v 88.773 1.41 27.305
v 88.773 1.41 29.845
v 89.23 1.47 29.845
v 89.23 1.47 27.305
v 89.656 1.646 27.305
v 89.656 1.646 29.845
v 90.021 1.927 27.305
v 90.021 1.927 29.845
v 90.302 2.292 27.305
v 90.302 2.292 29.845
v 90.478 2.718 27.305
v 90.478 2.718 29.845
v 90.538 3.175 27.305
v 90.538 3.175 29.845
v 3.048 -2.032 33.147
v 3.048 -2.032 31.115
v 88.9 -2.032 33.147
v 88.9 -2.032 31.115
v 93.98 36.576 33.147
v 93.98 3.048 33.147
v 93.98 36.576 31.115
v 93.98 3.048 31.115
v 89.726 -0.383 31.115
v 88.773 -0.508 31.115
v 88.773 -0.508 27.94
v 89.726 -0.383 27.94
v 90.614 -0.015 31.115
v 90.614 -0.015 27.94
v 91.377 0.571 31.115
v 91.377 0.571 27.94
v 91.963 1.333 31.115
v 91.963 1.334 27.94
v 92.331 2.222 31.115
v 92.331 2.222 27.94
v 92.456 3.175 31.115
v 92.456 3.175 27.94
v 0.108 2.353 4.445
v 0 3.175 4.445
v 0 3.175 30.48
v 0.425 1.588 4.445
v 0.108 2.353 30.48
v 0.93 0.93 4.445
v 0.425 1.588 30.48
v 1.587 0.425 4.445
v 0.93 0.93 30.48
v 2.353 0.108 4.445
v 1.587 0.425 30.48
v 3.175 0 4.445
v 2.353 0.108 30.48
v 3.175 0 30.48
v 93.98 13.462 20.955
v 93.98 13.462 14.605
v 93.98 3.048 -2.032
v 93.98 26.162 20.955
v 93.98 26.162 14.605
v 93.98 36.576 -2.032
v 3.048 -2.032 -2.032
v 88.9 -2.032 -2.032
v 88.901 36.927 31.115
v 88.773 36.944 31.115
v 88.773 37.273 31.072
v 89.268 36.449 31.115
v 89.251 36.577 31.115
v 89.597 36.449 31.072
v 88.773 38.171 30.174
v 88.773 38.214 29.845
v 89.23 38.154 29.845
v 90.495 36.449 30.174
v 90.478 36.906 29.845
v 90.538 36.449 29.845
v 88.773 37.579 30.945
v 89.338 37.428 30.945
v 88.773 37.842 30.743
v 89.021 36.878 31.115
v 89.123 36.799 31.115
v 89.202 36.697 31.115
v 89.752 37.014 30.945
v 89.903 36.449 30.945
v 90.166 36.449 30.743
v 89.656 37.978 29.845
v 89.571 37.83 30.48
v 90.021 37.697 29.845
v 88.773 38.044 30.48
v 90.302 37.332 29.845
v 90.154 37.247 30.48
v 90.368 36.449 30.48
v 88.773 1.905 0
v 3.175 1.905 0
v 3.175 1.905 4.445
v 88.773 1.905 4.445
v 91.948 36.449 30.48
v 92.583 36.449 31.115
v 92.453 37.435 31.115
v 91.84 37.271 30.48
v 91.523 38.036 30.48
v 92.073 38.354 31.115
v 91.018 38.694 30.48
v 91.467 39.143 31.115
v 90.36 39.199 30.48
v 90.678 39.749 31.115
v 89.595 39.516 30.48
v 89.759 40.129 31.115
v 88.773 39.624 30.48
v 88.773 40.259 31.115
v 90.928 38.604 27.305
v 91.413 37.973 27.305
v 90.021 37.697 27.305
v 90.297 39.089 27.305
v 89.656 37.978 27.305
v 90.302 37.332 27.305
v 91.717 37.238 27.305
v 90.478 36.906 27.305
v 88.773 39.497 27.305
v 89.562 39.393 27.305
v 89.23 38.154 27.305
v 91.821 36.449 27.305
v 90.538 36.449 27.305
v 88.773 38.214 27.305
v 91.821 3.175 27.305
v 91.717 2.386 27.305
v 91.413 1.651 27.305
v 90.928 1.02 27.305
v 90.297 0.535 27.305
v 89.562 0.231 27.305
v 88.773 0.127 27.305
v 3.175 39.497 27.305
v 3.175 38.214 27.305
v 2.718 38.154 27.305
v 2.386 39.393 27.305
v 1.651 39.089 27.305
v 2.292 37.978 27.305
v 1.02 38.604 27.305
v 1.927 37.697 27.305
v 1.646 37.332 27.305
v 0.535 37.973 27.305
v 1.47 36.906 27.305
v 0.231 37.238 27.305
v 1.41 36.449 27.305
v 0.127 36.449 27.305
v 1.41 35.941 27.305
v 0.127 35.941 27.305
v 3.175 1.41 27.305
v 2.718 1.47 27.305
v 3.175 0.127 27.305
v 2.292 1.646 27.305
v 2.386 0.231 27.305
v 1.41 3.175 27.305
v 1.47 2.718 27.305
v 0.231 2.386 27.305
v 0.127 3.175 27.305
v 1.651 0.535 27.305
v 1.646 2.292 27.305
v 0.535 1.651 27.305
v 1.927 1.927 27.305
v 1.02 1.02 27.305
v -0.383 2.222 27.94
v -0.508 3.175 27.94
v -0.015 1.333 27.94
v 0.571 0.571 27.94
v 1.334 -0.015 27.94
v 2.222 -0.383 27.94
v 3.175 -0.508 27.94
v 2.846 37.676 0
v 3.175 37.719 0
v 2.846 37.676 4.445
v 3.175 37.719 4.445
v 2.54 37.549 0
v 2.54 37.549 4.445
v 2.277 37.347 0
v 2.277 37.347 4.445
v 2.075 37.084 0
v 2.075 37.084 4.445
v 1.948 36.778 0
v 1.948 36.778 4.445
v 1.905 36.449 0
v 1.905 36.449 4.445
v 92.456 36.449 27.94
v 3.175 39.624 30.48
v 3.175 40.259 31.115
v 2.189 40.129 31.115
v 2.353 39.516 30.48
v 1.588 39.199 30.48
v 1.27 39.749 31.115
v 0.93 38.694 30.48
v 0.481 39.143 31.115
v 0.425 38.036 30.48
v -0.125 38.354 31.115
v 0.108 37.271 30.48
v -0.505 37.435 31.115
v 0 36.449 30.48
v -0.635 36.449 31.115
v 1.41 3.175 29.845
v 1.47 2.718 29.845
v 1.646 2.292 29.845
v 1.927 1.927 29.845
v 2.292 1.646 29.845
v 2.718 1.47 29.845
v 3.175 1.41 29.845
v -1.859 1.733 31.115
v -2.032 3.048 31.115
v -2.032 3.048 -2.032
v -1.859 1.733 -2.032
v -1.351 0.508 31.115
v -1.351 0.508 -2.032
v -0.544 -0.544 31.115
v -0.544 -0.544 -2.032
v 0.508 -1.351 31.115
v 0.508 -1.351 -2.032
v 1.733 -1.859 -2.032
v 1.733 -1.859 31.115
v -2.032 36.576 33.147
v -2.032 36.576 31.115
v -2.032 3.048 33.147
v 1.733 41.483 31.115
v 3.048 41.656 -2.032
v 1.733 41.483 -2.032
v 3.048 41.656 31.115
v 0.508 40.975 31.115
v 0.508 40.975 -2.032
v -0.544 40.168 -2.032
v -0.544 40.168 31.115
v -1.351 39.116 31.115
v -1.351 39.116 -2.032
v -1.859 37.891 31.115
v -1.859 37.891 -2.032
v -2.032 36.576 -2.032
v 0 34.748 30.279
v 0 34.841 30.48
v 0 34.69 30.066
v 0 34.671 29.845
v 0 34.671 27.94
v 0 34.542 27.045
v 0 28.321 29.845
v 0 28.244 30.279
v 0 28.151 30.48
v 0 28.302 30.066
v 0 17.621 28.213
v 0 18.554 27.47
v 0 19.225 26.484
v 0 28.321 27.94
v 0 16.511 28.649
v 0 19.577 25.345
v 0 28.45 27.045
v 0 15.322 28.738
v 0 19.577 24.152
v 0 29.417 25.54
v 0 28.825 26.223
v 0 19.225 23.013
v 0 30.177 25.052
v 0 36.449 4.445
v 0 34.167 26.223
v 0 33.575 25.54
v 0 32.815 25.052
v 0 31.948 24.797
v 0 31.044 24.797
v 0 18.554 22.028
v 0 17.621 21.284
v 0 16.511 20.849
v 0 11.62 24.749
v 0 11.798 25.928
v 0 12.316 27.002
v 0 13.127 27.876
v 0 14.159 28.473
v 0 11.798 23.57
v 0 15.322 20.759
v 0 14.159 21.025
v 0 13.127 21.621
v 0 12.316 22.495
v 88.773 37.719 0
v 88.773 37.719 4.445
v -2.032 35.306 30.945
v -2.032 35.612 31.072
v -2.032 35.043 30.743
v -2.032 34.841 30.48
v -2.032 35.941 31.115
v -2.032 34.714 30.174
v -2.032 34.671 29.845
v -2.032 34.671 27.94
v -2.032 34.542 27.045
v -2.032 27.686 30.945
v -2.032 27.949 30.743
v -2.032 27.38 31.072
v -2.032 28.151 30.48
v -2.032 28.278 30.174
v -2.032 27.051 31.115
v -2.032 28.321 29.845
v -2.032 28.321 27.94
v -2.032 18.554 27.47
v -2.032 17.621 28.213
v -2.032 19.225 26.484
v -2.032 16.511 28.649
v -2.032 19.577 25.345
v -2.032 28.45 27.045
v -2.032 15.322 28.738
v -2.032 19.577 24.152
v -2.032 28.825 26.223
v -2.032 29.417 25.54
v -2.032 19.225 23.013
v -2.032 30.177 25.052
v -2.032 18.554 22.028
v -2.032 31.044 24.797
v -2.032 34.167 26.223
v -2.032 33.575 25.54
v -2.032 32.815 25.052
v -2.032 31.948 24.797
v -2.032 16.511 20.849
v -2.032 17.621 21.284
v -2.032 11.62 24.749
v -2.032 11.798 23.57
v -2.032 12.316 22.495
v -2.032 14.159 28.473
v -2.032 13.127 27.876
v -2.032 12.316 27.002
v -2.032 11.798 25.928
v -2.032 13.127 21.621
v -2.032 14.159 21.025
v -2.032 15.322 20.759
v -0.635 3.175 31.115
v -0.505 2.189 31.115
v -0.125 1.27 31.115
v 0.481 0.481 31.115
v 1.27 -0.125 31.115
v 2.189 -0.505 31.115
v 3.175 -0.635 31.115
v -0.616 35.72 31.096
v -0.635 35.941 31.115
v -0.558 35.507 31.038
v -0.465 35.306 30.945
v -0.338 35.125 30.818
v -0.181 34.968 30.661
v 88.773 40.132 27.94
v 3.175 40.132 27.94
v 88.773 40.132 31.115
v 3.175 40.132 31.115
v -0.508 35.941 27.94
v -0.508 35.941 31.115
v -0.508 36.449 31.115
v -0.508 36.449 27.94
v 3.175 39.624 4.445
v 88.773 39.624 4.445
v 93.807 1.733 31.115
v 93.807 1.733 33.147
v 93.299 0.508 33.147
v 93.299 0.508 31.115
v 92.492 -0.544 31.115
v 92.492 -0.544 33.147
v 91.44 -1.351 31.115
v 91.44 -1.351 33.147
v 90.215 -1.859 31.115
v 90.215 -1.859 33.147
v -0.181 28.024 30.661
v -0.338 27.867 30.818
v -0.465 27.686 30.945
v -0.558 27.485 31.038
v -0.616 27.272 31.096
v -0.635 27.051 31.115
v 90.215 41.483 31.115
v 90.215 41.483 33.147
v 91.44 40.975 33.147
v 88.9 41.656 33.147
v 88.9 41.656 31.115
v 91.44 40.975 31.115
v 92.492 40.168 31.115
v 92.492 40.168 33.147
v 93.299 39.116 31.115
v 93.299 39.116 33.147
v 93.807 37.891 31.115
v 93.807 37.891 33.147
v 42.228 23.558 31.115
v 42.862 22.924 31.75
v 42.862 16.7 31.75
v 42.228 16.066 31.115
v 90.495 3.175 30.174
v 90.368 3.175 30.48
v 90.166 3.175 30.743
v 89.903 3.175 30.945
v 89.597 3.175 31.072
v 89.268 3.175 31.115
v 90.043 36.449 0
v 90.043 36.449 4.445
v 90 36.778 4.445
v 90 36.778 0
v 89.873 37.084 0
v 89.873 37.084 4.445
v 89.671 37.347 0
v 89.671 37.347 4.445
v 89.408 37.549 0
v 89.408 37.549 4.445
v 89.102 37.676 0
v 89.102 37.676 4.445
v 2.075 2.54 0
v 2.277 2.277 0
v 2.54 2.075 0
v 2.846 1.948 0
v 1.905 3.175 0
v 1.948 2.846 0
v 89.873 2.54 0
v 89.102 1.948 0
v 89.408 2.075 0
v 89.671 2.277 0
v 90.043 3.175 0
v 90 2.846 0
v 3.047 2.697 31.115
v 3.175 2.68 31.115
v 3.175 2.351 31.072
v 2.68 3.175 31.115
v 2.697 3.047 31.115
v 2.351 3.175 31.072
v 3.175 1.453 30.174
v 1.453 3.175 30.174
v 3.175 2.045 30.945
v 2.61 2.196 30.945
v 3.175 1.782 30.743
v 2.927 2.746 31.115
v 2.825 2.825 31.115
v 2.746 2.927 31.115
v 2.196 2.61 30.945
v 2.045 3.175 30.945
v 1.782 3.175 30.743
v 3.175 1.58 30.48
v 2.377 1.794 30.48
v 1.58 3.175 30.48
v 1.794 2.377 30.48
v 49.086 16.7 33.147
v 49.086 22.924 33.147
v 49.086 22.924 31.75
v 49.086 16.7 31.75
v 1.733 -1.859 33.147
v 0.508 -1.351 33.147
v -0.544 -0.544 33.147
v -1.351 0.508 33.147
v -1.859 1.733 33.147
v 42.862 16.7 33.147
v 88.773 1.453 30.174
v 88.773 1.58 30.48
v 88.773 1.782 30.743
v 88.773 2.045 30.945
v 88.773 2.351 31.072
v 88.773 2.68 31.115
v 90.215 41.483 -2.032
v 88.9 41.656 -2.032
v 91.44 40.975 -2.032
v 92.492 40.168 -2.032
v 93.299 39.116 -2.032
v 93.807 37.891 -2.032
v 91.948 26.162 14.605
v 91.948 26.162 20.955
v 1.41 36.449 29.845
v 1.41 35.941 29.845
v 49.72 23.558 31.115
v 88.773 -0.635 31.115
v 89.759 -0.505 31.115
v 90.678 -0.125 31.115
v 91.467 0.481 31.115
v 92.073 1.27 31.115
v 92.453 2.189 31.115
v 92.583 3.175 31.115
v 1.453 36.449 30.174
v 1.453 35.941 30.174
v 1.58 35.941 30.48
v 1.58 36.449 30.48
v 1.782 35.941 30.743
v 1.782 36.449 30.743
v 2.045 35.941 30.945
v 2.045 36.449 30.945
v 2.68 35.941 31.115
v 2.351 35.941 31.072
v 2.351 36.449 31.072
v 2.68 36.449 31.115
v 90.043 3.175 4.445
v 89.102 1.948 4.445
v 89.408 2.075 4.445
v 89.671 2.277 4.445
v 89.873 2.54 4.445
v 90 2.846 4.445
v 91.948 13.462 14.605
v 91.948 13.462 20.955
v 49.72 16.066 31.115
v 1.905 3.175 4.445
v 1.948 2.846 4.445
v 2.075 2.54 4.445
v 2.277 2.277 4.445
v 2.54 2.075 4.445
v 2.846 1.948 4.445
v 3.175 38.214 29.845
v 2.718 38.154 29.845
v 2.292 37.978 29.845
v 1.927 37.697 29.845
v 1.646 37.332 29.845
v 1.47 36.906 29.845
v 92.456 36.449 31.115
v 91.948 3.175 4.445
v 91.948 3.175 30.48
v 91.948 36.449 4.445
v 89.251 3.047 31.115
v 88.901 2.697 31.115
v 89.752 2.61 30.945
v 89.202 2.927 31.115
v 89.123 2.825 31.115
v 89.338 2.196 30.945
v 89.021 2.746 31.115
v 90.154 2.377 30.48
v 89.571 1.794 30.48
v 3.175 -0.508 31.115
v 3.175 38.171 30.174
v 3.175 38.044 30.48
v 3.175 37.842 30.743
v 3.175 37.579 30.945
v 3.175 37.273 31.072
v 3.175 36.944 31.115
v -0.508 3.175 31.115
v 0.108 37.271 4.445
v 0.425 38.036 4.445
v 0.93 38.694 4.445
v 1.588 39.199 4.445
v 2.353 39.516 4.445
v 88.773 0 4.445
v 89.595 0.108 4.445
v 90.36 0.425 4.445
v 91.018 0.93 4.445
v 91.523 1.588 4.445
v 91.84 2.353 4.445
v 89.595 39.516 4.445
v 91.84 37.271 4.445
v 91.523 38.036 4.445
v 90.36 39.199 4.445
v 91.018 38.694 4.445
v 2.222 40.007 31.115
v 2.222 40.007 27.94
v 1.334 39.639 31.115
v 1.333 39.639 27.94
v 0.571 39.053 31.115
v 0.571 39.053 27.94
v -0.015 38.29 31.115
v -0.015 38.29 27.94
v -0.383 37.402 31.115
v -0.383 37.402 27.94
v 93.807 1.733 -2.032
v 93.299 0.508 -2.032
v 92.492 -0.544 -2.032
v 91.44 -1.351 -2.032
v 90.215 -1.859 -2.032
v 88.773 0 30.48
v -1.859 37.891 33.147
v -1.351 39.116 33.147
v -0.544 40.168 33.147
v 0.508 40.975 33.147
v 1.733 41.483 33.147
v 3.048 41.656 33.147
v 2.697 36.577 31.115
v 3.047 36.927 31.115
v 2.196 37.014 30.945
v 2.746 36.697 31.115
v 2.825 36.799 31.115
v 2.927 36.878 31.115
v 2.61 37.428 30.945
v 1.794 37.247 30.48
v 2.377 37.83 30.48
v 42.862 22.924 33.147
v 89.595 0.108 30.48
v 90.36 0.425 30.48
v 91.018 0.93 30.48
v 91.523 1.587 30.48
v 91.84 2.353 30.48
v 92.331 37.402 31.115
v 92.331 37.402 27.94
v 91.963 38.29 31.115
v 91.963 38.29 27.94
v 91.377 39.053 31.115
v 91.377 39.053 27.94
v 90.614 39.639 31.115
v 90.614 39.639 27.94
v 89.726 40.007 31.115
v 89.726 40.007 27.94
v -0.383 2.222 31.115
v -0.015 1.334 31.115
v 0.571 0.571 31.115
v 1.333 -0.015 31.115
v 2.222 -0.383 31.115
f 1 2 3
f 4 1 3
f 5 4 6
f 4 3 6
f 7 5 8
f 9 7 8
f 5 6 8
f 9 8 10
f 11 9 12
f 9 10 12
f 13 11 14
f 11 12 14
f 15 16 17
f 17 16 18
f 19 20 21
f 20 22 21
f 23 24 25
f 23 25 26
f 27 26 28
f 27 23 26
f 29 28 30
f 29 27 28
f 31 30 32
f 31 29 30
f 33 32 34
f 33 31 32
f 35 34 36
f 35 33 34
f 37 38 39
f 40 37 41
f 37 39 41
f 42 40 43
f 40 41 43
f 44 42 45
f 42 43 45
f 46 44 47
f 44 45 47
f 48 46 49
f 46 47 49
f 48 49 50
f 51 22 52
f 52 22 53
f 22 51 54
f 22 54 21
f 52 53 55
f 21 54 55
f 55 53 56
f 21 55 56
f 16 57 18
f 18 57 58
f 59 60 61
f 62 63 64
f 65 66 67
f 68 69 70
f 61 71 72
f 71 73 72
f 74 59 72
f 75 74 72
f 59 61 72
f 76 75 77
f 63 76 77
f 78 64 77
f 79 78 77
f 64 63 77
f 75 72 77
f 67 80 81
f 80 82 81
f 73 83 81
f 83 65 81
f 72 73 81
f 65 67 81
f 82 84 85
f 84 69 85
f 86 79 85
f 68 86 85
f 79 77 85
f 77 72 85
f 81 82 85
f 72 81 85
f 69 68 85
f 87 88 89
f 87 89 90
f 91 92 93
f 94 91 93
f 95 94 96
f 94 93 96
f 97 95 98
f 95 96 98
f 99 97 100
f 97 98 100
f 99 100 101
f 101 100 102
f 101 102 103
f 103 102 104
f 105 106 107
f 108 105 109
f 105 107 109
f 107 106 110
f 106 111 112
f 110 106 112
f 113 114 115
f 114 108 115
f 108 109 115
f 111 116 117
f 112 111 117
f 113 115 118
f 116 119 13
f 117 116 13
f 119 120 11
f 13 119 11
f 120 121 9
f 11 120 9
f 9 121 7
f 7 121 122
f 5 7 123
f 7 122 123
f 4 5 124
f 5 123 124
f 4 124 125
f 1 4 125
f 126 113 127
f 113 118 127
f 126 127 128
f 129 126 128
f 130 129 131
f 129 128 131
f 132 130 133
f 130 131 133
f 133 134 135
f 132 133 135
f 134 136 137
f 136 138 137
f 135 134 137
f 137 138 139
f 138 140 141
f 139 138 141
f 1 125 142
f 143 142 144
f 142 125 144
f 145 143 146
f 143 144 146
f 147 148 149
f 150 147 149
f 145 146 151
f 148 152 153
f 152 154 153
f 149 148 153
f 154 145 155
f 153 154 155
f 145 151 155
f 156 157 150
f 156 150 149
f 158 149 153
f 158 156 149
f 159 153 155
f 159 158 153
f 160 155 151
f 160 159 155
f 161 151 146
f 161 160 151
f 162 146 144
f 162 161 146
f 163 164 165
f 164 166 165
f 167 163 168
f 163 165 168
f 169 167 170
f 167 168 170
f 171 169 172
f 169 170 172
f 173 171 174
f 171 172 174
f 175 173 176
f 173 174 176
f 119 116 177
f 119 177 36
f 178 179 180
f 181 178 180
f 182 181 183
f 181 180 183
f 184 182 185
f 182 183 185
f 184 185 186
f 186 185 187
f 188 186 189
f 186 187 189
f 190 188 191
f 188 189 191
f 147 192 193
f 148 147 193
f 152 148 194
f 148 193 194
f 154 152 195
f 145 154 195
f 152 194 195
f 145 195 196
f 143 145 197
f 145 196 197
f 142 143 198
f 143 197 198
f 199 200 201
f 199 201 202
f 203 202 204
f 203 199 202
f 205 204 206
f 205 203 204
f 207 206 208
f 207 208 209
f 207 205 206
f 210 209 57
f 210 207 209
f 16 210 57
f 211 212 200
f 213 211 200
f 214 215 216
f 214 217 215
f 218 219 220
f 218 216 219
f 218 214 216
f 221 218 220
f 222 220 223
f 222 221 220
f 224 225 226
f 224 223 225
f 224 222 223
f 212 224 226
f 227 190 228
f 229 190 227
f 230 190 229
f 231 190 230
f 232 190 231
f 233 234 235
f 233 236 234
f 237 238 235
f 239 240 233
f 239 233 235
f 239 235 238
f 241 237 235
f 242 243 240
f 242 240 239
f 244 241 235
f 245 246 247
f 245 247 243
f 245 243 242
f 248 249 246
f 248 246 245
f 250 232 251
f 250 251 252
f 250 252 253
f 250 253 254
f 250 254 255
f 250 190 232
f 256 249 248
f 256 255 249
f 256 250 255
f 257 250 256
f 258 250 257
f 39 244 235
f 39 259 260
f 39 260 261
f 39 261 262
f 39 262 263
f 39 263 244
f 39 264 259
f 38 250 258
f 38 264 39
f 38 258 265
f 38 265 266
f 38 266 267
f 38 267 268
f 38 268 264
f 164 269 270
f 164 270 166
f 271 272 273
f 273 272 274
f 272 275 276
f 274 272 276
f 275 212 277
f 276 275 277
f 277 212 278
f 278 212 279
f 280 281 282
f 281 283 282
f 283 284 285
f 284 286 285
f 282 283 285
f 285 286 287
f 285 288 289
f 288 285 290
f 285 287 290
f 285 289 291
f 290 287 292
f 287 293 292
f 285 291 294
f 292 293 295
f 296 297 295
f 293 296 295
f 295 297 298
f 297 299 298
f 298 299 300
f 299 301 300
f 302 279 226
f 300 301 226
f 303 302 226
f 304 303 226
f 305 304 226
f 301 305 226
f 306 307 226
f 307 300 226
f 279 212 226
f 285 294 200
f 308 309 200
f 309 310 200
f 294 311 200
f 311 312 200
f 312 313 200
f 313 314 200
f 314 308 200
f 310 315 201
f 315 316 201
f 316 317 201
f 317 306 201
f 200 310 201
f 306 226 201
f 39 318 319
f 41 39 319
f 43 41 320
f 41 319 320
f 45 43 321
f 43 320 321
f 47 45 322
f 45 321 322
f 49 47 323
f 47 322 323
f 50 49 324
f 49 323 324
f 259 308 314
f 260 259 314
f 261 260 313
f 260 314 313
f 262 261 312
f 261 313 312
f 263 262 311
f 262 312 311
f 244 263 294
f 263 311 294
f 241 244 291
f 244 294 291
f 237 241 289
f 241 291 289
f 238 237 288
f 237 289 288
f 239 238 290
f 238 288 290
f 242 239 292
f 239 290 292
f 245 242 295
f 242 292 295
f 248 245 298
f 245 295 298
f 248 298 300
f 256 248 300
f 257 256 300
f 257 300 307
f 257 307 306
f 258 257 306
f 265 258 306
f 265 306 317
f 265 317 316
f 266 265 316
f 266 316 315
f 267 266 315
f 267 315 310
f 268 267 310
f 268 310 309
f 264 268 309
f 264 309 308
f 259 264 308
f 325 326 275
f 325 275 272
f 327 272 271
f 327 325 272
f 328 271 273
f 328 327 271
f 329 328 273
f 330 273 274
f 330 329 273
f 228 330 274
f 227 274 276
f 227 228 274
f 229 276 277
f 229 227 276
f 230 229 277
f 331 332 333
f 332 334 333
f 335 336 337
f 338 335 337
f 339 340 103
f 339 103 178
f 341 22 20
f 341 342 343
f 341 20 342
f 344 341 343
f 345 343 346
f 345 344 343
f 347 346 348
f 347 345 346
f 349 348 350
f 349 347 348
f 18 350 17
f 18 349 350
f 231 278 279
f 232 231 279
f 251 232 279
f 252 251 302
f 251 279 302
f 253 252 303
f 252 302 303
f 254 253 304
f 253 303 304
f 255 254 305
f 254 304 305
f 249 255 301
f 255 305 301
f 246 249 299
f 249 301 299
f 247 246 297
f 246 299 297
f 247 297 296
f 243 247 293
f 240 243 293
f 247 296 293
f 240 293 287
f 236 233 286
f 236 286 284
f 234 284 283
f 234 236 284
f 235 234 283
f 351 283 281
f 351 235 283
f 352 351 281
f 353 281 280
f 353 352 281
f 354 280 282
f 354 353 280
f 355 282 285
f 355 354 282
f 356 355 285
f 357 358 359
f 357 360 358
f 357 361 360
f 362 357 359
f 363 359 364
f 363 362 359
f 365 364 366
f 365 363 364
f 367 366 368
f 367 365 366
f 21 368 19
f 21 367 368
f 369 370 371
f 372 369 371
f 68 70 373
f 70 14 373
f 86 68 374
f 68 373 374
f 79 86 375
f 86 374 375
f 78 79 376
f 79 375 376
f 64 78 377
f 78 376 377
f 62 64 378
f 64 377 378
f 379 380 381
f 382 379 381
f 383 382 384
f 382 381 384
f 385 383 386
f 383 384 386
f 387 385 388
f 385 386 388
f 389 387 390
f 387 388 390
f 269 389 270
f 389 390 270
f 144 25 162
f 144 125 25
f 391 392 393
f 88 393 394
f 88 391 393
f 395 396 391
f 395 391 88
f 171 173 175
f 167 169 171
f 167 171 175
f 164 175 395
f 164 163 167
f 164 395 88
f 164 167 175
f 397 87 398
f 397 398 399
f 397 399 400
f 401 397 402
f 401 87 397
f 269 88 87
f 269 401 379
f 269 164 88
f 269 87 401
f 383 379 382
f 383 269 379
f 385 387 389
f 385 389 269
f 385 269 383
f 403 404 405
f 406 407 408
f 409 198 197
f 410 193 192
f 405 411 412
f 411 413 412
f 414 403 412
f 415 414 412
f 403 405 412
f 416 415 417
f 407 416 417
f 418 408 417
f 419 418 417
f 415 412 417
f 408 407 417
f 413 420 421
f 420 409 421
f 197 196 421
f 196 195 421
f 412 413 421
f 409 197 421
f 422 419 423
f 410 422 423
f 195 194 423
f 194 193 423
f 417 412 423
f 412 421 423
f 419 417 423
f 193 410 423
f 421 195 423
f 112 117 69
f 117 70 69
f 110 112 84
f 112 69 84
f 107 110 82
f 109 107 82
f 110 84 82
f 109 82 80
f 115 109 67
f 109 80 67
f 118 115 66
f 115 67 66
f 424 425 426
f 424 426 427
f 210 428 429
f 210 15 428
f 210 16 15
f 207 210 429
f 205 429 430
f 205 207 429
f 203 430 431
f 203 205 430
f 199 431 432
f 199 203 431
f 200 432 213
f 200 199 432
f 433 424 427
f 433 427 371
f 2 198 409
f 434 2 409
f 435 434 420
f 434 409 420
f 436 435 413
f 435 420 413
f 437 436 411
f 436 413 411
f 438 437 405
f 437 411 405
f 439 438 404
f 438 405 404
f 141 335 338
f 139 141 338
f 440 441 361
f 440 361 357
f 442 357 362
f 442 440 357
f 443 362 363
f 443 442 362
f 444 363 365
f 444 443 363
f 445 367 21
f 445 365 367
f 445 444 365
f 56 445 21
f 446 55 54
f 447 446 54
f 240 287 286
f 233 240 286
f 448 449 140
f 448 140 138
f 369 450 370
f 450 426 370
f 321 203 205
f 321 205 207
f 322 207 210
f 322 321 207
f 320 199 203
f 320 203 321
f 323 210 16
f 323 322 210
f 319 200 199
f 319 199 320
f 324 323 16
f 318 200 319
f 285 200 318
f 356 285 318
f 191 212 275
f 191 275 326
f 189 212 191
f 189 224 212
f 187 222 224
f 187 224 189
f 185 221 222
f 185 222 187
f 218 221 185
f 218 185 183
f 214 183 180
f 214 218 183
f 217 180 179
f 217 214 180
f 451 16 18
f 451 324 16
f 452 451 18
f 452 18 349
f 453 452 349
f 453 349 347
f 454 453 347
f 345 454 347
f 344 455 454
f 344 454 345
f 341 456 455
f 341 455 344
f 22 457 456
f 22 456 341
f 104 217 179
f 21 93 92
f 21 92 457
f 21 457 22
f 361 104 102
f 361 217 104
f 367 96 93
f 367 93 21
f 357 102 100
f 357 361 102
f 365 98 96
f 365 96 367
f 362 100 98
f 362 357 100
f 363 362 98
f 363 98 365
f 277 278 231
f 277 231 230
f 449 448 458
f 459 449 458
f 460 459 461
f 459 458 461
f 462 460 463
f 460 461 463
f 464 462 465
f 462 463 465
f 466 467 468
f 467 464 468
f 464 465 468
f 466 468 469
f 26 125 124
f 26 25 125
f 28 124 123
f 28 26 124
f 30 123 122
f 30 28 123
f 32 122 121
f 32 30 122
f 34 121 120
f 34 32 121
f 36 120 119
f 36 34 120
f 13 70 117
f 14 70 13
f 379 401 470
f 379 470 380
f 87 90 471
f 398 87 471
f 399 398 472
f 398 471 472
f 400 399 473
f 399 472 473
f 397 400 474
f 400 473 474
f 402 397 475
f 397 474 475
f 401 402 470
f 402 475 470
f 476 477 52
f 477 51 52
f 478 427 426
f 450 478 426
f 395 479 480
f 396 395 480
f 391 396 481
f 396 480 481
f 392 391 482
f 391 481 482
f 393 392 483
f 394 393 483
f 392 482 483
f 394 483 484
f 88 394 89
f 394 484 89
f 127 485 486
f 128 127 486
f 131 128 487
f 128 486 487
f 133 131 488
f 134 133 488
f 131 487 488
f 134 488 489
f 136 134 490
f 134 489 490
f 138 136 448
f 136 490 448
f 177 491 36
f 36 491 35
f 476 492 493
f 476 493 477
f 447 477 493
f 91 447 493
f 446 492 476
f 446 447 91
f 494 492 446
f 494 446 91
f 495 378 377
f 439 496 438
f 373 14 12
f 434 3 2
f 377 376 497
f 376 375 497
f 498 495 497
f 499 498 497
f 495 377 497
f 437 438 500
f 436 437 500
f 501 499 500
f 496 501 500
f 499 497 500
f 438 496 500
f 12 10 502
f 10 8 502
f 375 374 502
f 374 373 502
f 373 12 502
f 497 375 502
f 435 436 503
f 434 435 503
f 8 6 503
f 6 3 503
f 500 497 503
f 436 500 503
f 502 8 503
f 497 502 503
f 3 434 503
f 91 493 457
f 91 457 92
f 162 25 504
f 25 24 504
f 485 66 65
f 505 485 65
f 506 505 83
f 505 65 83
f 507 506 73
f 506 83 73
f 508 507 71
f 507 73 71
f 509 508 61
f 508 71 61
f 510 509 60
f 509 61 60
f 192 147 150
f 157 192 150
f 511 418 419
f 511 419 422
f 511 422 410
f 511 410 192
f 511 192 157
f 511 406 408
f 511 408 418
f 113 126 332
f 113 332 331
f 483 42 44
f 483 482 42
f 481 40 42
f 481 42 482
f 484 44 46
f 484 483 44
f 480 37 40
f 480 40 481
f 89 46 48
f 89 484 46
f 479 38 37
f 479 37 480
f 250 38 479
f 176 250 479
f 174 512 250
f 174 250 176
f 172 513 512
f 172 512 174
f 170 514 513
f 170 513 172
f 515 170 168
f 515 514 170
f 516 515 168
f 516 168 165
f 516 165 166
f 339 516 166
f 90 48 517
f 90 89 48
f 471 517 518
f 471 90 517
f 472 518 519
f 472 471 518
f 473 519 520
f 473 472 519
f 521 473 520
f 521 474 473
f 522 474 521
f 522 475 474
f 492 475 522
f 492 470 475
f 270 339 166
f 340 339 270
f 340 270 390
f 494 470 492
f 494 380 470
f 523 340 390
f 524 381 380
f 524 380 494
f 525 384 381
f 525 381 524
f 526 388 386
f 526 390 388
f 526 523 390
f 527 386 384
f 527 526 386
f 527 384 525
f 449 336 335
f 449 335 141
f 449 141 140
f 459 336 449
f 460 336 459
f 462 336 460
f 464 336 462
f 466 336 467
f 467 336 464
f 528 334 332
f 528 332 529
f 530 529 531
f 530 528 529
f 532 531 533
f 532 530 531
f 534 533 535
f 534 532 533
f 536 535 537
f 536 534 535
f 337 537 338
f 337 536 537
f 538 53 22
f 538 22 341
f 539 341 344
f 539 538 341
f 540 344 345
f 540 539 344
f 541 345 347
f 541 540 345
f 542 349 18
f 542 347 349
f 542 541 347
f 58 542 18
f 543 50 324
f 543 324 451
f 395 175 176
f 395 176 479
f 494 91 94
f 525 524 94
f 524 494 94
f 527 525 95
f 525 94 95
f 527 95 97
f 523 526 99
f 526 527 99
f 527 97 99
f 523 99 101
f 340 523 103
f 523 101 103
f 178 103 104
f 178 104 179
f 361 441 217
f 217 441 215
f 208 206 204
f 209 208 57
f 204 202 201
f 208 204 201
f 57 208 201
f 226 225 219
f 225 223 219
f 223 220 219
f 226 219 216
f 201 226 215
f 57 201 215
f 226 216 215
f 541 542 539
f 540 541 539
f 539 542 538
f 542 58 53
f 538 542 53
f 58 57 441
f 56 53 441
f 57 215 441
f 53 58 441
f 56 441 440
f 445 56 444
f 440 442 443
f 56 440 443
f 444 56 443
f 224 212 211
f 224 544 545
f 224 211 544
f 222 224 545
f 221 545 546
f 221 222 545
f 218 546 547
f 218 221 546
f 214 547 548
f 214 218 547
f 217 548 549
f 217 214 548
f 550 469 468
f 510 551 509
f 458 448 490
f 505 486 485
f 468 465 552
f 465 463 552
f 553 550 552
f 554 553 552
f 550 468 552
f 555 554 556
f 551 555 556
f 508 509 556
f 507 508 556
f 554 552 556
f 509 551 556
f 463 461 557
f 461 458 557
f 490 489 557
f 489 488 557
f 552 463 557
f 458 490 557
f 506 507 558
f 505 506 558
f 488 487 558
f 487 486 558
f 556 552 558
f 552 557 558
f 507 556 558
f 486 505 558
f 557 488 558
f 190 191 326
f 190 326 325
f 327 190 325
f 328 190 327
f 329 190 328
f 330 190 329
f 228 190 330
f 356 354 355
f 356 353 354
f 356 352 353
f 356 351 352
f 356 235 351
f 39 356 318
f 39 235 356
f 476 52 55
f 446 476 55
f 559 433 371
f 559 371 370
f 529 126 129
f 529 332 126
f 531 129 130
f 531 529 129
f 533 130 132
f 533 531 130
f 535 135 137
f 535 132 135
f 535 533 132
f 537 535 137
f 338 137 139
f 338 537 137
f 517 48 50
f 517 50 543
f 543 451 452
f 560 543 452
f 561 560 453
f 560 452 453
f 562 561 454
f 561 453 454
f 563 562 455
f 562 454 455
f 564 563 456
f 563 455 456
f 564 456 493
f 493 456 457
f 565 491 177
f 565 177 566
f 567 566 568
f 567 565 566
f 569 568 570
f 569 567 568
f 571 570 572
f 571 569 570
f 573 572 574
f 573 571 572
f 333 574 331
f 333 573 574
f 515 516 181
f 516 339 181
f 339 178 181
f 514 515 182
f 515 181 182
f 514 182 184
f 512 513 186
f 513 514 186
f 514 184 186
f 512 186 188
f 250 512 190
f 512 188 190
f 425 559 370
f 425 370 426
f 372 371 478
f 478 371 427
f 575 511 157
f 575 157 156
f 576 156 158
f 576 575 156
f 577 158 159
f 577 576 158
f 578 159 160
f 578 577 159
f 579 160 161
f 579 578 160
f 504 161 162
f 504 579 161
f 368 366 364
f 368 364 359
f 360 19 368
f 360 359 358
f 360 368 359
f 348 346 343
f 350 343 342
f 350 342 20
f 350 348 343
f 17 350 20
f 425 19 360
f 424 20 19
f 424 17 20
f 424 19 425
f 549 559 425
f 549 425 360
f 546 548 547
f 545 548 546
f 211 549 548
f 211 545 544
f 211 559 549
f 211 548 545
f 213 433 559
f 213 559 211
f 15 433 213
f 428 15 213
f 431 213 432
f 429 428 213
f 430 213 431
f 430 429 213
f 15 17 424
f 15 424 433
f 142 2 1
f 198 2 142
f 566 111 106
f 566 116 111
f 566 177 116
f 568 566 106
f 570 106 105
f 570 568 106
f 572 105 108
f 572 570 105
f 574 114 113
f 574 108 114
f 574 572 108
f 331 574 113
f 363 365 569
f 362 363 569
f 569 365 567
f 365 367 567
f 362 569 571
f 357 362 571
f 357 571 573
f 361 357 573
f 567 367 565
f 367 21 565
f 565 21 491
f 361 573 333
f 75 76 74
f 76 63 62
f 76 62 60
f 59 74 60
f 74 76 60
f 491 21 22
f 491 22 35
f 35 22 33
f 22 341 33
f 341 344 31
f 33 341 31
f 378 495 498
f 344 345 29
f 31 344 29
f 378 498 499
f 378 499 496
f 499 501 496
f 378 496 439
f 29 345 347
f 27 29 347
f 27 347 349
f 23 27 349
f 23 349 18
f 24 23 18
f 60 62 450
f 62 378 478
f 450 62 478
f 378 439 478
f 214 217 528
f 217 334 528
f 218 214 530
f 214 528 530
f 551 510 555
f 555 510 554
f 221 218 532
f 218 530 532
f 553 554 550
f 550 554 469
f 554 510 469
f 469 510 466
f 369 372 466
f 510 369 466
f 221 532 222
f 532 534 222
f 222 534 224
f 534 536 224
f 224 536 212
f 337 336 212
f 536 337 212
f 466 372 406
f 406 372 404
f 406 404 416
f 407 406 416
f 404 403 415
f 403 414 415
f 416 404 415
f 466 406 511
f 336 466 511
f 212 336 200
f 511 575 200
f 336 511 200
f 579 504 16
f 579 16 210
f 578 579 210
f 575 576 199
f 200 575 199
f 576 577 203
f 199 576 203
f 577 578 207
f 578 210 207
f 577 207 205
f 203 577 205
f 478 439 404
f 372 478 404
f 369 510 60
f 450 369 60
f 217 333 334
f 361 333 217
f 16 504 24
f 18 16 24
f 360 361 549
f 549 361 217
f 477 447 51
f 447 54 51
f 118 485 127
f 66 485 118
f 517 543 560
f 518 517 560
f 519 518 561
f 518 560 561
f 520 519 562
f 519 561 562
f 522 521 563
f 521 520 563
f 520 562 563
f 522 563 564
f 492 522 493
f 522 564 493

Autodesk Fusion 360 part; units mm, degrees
sketch "Sketch1" plane through (0, 0, 0) normal (0, 0, 1) x (1, 0, 0)
  line L0 (0, 0) -> (91.948, 0)
  line L1 (91.948, 0) -> (91.948, 39.624)
  line L2 (91.948, 39.624) -> (0, 39.624)
  line L3 (0, 39.624) -> (0, 0)
  line L4 (-2.032, 41.656) -> (-2.032, -2.032)
  line L5 (-2.032, -2.032) -> (93.98, -2.032)
  line L6 (93.98, -2.032) -> (93.98, 41.656)
  line L7 (93.98, 41.656) -> (-2.032, 41.656)
  line L8 (1.905, 37.719) -> (1.905, 1.905)
  line L9 (1.905, 1.905) -> (90.043, 1.905)
  line L10 (90.043, 1.905) -> (90.043, 37.719)
  line L11 (90.043, 37.719) -> (1.905, 37.719)
  dimension "d1" = 91.948
  dimension "d2" = 39.624
  dimension "d3" = 2.032
  dimension "d4" = -1.905
extrude "Extrude1" add sketch "Sketch1" against normal blind 2.032 contours L0 L1 L2 L3 | L4 L5 L6 L7 | L8 L9 L10 L11 makes body 1
extrude "Extrude2" add sketch "Sketch1" along normal blind 4.445 contours L0 L1 L2 L3 bodies 1
extrude "Extrude3" add sketch "Sketch1" along normal blind 31.115 contours L4 L5 L6 L7 bodies 1
sketch "Sketch2" plane through (93.98, 0, 0) normal (1, 0, 0) x (0, 1, 0)
  line L0 (-2.032, 31.115) -> (-2.032, -2.032)
  line L1 (-2.032, -2.032) -> (41.656, -2.032)
  line L2 (41.656, -2.032) -> (41.656, 31.115)
  line L3 (41.656, 31.115) -> (-2.032, 31.115)
  line L4 (19.812, -2.032) -> (19.812, 20.955)
  line L5 (19.812, 20.955) -> (26.162, 20.955)
  line L6 (19.812, 20.955) -> (13.462, 20.955)
  line L7 (13.462, 20.955) -> (13.462, 14.605)
  line L8 (13.462, 14.605) -> (26.162, 14.605)
  line L9 (26.162, 14.605) -> (26.162, 20.955)
  dimension "d11" = 22.987
  dimension "d12" = 6.35
  dimension "d13" = 6.35
  dimension "d14" = 6.35
extrude "Extrude4" cut sketch "Sketch2" against normal blind 7.62 contours L4 L6 L7 L8 | L4 L5 L8 L9 bodies 1
sketch "Sketch3" plane through (-2.032, 0, 0) normal (-1, 0, 0) x (0, -1, 0)
  line L0 (-41.656, 31.115) -> (-41.656, -2.032)
  line L1 (-41.656, -2.032) -> (2.032, -2.032)
  line L2 (2.032, -2.032) -> (2.032, 31.115)
  line L3 (2.032, 31.115) -> (-41.656, 31.115)
  line L4 (-15.621, 31.0987) -> (-15.621, 24.7487)
  circle A0 centre (-15.621, 24.7487) radius 4.0005
  line L5 (-41.656, 31.115) -> (-31.496, 31.115)
  line L6 (-31.496, 31.115) -> (-31.496, 24.765)
  circle A1 centre (-31.496, 27.94) radius 3.175
  line L7 (-28.321, 27.94) -> (-28.321, 31.115)
  line L8 (-34.671, 27.94) -> (-34.671, 31.115)
  dimension "d20" = 6.35
  dimension "d21" = 8.001
  dimension "d34" = 17.653
  dimension "d35" = 10.16
  dimension "d36" = 6.35
extrude "Extrude5" cut sketch "Sketch3" against normal blind 2.54 contours L3 L5 A1 L8 | L6 A1 | L3 A1 L7 | L6 A1 | A0 bodies 1
fillet "Fillet1" radius 1.27 4 edges at (1.905, 37.719, 2.2225) (1.905, 1.905, 2.2225) (90.043, 37.719, 2.2225) (90.043, 1.905, 2.2225) on bodies 1
fillet "Fillet2" radius 3.175 4 edges at (91.948, 0, 17.78) (91.948, 39.624, 17.78) (0, 39.624, 17.78) (0, 0, 17.78) on bodies 1
fillet "Fillet3" radius 5.08 4 edges at (93.98, -2.032, 14.5415) (93.98, 41.656, 14.5415) (-2.032, -2.032, 14.5415) (-2.032, 41.656, 14.5415) on bodies 1
chamfer "Chamfer1" distance 0.635 angle 45 9 edges at (45.974, 0, 31.115) (0.9299, 0.9299, 31.115) (0, 15.748, 31.115) (0, 35.56, 31.115) (0.9299, 38.6941, 31.115) (45.974, 39.624, 31.115) (91.0181, 38.6941, 31.115) (91.948, 19.812, 31.115) (91.0181, 0.9299, 31.115) on bodies 1
fillet "Fillet5" radius 1.27 2 edges at (-1.3335, 34.671, 31.115) (-1.3335, 28.321, 31.115) on bodies 1
sketch "Sketch1 (2)" plane through (0, 0, 31.115) normal (0, 0, 1) x (-1, 0, 0) in component "Top"
  line L0 (0.635, -27.051) -> (2.032, -27.051)
  line L1 (2.032, -27.051) -> (2.032, -3.048)
  arc A0 (2.032, -3.048) -> (-3.048, 2.032) centre (-3.048, -3.048) ccw
  line L2 (-3.048, 2.032) -> (-88.9, 2.032)
  arc A1 (-88.9, 2.032) -> (-93.98, -3.048) centre (-88.9, -3.048) ccw
  line L3 (-93.98, -3.048) -> (-93.98, -36.576)
  arc A2 (-93.98, -36.576) -> (-88.9, -41.656) centre (-88.9, -36.576) ccw
  line L4 (-88.9, -41.656) -> (-3.048, -41.656)
  arc A3 (-3.048, -41.656) -> (2.032, -36.576) centre (-3.048, -36.576) ccw
  line L5 (2.032, -36.576) -> (2.032, -35.941)
  line L6 (2.032, -35.941) -> (0.635, -35.941)
  line L7 (0.635, -35.941) -> (0.635, -36.449)
  arc A4 (-3.175, -40.259) -> (0.635, -36.449) centre (-3.175, -36.449) ccw
  line L8 (-3.175, -40.259) -> (-88.773, -40.259)
  arc A5 (-92.583, -36.449) -> (-88.773, -40.259) centre (-88.773, -36.449) ccw
  line L9 (-92.583, -36.449) -> (-92.583, -3.175)
  arc A6 (-88.773, 0.635) -> (-92.583, -3.175) centre (-88.773, -3.175) ccw
  line L10 (-88.773, 0.635) -> (-3.175, 0.635)
  arc A7 (0.635, -3.175) -> (-3.175, 0.635) centre (-3.175, -3.175) ccw
  line L11 (0.635, -3.175) -> (0.635, -27.051)
  line L12 (-3.048, 4.0767) -> (-88.9, 4.0767)
  arc A8 (-88.9, 4.0767) -> (-96.0247, -3.048) centre (-88.9, -3.048) ccw
  line L13 (-96.0247, -3.048) -> (-96.0247, -36.576)
  arc A9 (-96.0247, -36.576) -> (-88.9, -43.7007) centre (-88.9, -36.576) ccw
  line L14 (-88.9, -43.7007) -> (-3.048, -43.7007)
  arc A10 (-3.048, -43.7007) -> (4.0767, -36.576) centre (-3.048, -36.576) ccw
  line L15 (4.0767, -36.576) -> (4.0767, -33.8963)
  line L16 (4.0767, -33.8963) -> (-1.4097, -33.8963)
  line L17 (-1.4097, -33.8963) -> (-1.4097, -36.449)
  arc A11 (-3.175, -38.2143) -> (-1.4097, -36.449) centre (-3.175, -36.449) ccw
  line L18 (-3.175, -38.2143) -> (-88.773, -38.2143)
  arc A12 (-90.5383, -36.449) -> (-88.773, -38.2143) centre (-88.773, -36.449) ccw
  line L19 (-90.5383, -36.449) -> (-90.5383, -3.175)
  arc A13 (-88.773, -1.4097) -> (-90.5383, -3.175) centre (-88.773, -3.175) ccw
  line L20 (-88.773, -1.4097) -> (-3.175, -1.4097)
  arc A14 (-1.4097, -3.175) -> (-3.175, -1.4097) centre (-3.175, -3.175) ccw
  line L21 (-1.4097, -3.175) -> (-1.4097, -29.0957)
  line L22 (-1.4097, -29.0957) -> (4.0767, -29.0957)
  line L23 (4.0767, -29.0957) -> (4.0767, -3.048)
  arc A15 (4.0767, -3.048) -> (-3.048, 4.0767) centre (-3.048, -3.048) ccw
  line L24 (-3.048, 2.159) -> (-88.9, 2.159)
  arc A16 (-88.9, 2.159) -> (-94.107, -3.048) centre (-88.9, -3.048) ccw
  line L25 (-94.107, -3.048) -> (-94.107, -36.576)
  arc A17 (-94.107, -36.576) -> (-88.9, -41.783) centre (-88.9, -36.576) ccw
  line L26 (-88.9, -41.783) -> (-3.048, -41.783)
  arc A18 (-3.048, -41.783) -> (2.159, -36.576) centre (-3.048, -36.576) ccw
  line L27 (2.159, -36.576) -> (2.159, -35.814)
  line L28 (2.159, -35.814) -> (0.508, -35.814)
  line L29 (0.508, -35.814) -> (0.508, -36.449)
  arc A19 (-3.175, -40.132) -> (0.508, -36.449) centre (-3.175, -36.449) ccw
  line L30 (-3.175, -40.132) -> (-88.773, -40.132)
  arc A20 (-92.456, -36.449) -> (-88.773, -40.132) centre (-88.773, -36.449) ccw
  line L31 (-92.456, -36.449) -> (-92.456, -3.175)
  arc A21 (-88.773, 0.508) -> (-92.456, -3.175) centre (-88.773, -3.175) ccw
  line L32 (-88.773, 0.508) -> (-3.175, 0.508)
  arc A22 (0.508, -3.175) -> (-3.175, 0.508) centre (-3.175, -3.175) ccw
  line L33 (0.508, -3.175) -> (0.508, -27.178)
  line L34 (0.508, -27.178) -> (2.159, -27.178)
  line L35 (2.159, -27.178) -> (2.159, -3.048)
  arc A23 (2.159, -3.048) -> (-3.048, 2.159) centre (-3.048, -3.048) ccw
  line L36 (2.032, -27.051) -> (2.032, -35.941)
  line L37 (0.635, -27.051) -> (0.635, -35.941)
  line L38 (0.635, -27.051) -> (-1.4097, -27.051)
  line L39 (0.635, -35.941) -> (-1.4097, -35.941)
  line L40 (-1.4097, -3.175) -> (4.0767, -3.175)
  dimension "d39" = 2.0447
  dimension "d40" = 0.127
extrude "Extrude1'" add sketch "Sketch1 (2)" along normal blind 2.032 separate body contours L0 L1 L11 L40 | L11 L33 L38 L40 | L0 L34 L36 L37 | L33 L34 L37 L38 | L7 A4 L8 A5 L9 A6 L10 A7 L29 A19 L30 A20 L31 A21 L32 A22 L39 L40 | L1 A0 L2 A1 L3 A2 L4 A3 L5 L6 L7 A4 L8 A5 L9 A6 L10 A7 L40 | L21 L22 L33 L34 L37 L38 | L22 L34 L36 L37 | L21 L33 L38 L40 | L17 A11 L18 A12 L19 A13 L20 A14 L29 A19 L30 A20 L31 A21 L32 A22 L39 L40 | L16 L17 A11 L18 A12 L19 A13 L20 A14 L21 L22 L37 | L16 L22 L36 L37 | L16 L17 L28 L29 L37 L39 | L16 L28 L36 L37 | L28 L29 L37 L39 | L6 L28 L36 L37 makes body 2 in component "Top"
extrude "Extrude2'" add sketch "Sketch1 (2)" against normal blind 3.81 contours L21 L33 L38 L40 | L17 A11 L18 A12 L19 A13 L20 A14 L29 A19 L30 A20 L31 A21 L32 A22 L39 L40 bodies 2 in component "Top"
sketch "Sketch2 (2)" plane through (0, 0, 33.147) normal (0, 0, 1) x (-1, 0, 0) in component "Top"
  arc A0 (2.032, -3.048) -> (-3.048, 2.032) centre (-3.048, -3.048) ccw
  line L0 (-3.048, 2.032) -> (-88.9, 2.032)
  arc A1 (-88.9, 2.032) -> (-93.98, -3.048) centre (-88.9, -3.048) ccw
  line L1 (-93.98, -3.048) -> (-93.98, -36.576)
  arc A2 (-93.98, -36.576) -> (-88.9, -41.656) centre (-88.9, -36.576) ccw
  line L2 (-88.9, -41.656) -> (-3.048, -41.656)
  arc A3 (-3.048, -41.656) -> (2.032, -36.576) centre (-3.048, -36.576) ccw
  line L3 (2.032, -36.576) -> (2.032, -3.048)
  line L4 (-45.974, -41.656) -> (-45.974, -19.812)
  line L5 (-49.0855, -16.7005) -> (-42.8625, -16.7005)
  line L6 (-42.8625, -16.7005) -> (-42.8625, -22.9235)
  line L7 (-42.8625, -22.9235) -> (-49.0855, -22.9235)
  line L8 (-49.0855, -22.9235) -> (-49.0855, -16.7005)
  line L9 (-49.0855, -16.7005) -> (-42.8625, -22.9235) construction
  line L10 (-42.8625, -16.7005) -> (-49.0855, -22.9235) construction
  point P0 (-45.974, -19.812)
  dimension "d45" = 6.223
  dimension "d46" = 6.223
extrude "Extrude3'" cut sketch "Sketch2 (2)" against normal blind 2.54 contours L5 L6 L7 L8 bodies 2 in component "Top"
extrude "Extrude4'" cut sketch "Sketch1 (2)" against normal blind 4.318 contours L21 L33 L38 L40 bodies 2 in component "Top"
fillet "Fillet1'" radius 1.27 8 edges at (1.4097, 36.195, 31.115) (1.9267, 37.6973, 31.115) (45.974, 38.2143, 31.115) (90.0213, 37.6973, 31.115) (90.5383, 19.812, 31.115) (90.0213, 1.9267, 31.115) (45.974, 1.4097, 31.115) (1.9267, 1.9267, 31.115) on bodies 2 in component "Top"
chamfer "Chamfer1'" distance 0.635 angle 45 8 edges at (-0.508, 36.195, 27.305) (0.5707, 39.0533, 27.305) (45.974, 40.132, 27.305) (91.3773, 39.0533, 27.305) (92.456, 19.812, 27.305) (91.3773, 0.5707, 27.305) (45.974, -0.508, 27.305) (0.5707, 0.5707, 27.305) on bodies 2 in component "Top"
chamfer "Chamfer2" distance 0.635 angle 45 4 edges at (42.8625, 19.812, 31.115) (45.974, 22.9235, 31.115) (49.0855, 19.812, 31.115) (45.974, 16.7005, 31.115) on bodies 2 in component "Top"
component "Top" placed x (1, 0, 0) y (0, 1, 0) z (0, 0, 1) at (0, 0, 0)
equation "d1 = 3.55 in + 0.07 in"
equation "d9 = 1.175 in + 0.05 in"
equation "d11 = 0.08 in + 0.175 in + 0.65 in"
equation "d34 = 0.86 in - 0.165 in"
